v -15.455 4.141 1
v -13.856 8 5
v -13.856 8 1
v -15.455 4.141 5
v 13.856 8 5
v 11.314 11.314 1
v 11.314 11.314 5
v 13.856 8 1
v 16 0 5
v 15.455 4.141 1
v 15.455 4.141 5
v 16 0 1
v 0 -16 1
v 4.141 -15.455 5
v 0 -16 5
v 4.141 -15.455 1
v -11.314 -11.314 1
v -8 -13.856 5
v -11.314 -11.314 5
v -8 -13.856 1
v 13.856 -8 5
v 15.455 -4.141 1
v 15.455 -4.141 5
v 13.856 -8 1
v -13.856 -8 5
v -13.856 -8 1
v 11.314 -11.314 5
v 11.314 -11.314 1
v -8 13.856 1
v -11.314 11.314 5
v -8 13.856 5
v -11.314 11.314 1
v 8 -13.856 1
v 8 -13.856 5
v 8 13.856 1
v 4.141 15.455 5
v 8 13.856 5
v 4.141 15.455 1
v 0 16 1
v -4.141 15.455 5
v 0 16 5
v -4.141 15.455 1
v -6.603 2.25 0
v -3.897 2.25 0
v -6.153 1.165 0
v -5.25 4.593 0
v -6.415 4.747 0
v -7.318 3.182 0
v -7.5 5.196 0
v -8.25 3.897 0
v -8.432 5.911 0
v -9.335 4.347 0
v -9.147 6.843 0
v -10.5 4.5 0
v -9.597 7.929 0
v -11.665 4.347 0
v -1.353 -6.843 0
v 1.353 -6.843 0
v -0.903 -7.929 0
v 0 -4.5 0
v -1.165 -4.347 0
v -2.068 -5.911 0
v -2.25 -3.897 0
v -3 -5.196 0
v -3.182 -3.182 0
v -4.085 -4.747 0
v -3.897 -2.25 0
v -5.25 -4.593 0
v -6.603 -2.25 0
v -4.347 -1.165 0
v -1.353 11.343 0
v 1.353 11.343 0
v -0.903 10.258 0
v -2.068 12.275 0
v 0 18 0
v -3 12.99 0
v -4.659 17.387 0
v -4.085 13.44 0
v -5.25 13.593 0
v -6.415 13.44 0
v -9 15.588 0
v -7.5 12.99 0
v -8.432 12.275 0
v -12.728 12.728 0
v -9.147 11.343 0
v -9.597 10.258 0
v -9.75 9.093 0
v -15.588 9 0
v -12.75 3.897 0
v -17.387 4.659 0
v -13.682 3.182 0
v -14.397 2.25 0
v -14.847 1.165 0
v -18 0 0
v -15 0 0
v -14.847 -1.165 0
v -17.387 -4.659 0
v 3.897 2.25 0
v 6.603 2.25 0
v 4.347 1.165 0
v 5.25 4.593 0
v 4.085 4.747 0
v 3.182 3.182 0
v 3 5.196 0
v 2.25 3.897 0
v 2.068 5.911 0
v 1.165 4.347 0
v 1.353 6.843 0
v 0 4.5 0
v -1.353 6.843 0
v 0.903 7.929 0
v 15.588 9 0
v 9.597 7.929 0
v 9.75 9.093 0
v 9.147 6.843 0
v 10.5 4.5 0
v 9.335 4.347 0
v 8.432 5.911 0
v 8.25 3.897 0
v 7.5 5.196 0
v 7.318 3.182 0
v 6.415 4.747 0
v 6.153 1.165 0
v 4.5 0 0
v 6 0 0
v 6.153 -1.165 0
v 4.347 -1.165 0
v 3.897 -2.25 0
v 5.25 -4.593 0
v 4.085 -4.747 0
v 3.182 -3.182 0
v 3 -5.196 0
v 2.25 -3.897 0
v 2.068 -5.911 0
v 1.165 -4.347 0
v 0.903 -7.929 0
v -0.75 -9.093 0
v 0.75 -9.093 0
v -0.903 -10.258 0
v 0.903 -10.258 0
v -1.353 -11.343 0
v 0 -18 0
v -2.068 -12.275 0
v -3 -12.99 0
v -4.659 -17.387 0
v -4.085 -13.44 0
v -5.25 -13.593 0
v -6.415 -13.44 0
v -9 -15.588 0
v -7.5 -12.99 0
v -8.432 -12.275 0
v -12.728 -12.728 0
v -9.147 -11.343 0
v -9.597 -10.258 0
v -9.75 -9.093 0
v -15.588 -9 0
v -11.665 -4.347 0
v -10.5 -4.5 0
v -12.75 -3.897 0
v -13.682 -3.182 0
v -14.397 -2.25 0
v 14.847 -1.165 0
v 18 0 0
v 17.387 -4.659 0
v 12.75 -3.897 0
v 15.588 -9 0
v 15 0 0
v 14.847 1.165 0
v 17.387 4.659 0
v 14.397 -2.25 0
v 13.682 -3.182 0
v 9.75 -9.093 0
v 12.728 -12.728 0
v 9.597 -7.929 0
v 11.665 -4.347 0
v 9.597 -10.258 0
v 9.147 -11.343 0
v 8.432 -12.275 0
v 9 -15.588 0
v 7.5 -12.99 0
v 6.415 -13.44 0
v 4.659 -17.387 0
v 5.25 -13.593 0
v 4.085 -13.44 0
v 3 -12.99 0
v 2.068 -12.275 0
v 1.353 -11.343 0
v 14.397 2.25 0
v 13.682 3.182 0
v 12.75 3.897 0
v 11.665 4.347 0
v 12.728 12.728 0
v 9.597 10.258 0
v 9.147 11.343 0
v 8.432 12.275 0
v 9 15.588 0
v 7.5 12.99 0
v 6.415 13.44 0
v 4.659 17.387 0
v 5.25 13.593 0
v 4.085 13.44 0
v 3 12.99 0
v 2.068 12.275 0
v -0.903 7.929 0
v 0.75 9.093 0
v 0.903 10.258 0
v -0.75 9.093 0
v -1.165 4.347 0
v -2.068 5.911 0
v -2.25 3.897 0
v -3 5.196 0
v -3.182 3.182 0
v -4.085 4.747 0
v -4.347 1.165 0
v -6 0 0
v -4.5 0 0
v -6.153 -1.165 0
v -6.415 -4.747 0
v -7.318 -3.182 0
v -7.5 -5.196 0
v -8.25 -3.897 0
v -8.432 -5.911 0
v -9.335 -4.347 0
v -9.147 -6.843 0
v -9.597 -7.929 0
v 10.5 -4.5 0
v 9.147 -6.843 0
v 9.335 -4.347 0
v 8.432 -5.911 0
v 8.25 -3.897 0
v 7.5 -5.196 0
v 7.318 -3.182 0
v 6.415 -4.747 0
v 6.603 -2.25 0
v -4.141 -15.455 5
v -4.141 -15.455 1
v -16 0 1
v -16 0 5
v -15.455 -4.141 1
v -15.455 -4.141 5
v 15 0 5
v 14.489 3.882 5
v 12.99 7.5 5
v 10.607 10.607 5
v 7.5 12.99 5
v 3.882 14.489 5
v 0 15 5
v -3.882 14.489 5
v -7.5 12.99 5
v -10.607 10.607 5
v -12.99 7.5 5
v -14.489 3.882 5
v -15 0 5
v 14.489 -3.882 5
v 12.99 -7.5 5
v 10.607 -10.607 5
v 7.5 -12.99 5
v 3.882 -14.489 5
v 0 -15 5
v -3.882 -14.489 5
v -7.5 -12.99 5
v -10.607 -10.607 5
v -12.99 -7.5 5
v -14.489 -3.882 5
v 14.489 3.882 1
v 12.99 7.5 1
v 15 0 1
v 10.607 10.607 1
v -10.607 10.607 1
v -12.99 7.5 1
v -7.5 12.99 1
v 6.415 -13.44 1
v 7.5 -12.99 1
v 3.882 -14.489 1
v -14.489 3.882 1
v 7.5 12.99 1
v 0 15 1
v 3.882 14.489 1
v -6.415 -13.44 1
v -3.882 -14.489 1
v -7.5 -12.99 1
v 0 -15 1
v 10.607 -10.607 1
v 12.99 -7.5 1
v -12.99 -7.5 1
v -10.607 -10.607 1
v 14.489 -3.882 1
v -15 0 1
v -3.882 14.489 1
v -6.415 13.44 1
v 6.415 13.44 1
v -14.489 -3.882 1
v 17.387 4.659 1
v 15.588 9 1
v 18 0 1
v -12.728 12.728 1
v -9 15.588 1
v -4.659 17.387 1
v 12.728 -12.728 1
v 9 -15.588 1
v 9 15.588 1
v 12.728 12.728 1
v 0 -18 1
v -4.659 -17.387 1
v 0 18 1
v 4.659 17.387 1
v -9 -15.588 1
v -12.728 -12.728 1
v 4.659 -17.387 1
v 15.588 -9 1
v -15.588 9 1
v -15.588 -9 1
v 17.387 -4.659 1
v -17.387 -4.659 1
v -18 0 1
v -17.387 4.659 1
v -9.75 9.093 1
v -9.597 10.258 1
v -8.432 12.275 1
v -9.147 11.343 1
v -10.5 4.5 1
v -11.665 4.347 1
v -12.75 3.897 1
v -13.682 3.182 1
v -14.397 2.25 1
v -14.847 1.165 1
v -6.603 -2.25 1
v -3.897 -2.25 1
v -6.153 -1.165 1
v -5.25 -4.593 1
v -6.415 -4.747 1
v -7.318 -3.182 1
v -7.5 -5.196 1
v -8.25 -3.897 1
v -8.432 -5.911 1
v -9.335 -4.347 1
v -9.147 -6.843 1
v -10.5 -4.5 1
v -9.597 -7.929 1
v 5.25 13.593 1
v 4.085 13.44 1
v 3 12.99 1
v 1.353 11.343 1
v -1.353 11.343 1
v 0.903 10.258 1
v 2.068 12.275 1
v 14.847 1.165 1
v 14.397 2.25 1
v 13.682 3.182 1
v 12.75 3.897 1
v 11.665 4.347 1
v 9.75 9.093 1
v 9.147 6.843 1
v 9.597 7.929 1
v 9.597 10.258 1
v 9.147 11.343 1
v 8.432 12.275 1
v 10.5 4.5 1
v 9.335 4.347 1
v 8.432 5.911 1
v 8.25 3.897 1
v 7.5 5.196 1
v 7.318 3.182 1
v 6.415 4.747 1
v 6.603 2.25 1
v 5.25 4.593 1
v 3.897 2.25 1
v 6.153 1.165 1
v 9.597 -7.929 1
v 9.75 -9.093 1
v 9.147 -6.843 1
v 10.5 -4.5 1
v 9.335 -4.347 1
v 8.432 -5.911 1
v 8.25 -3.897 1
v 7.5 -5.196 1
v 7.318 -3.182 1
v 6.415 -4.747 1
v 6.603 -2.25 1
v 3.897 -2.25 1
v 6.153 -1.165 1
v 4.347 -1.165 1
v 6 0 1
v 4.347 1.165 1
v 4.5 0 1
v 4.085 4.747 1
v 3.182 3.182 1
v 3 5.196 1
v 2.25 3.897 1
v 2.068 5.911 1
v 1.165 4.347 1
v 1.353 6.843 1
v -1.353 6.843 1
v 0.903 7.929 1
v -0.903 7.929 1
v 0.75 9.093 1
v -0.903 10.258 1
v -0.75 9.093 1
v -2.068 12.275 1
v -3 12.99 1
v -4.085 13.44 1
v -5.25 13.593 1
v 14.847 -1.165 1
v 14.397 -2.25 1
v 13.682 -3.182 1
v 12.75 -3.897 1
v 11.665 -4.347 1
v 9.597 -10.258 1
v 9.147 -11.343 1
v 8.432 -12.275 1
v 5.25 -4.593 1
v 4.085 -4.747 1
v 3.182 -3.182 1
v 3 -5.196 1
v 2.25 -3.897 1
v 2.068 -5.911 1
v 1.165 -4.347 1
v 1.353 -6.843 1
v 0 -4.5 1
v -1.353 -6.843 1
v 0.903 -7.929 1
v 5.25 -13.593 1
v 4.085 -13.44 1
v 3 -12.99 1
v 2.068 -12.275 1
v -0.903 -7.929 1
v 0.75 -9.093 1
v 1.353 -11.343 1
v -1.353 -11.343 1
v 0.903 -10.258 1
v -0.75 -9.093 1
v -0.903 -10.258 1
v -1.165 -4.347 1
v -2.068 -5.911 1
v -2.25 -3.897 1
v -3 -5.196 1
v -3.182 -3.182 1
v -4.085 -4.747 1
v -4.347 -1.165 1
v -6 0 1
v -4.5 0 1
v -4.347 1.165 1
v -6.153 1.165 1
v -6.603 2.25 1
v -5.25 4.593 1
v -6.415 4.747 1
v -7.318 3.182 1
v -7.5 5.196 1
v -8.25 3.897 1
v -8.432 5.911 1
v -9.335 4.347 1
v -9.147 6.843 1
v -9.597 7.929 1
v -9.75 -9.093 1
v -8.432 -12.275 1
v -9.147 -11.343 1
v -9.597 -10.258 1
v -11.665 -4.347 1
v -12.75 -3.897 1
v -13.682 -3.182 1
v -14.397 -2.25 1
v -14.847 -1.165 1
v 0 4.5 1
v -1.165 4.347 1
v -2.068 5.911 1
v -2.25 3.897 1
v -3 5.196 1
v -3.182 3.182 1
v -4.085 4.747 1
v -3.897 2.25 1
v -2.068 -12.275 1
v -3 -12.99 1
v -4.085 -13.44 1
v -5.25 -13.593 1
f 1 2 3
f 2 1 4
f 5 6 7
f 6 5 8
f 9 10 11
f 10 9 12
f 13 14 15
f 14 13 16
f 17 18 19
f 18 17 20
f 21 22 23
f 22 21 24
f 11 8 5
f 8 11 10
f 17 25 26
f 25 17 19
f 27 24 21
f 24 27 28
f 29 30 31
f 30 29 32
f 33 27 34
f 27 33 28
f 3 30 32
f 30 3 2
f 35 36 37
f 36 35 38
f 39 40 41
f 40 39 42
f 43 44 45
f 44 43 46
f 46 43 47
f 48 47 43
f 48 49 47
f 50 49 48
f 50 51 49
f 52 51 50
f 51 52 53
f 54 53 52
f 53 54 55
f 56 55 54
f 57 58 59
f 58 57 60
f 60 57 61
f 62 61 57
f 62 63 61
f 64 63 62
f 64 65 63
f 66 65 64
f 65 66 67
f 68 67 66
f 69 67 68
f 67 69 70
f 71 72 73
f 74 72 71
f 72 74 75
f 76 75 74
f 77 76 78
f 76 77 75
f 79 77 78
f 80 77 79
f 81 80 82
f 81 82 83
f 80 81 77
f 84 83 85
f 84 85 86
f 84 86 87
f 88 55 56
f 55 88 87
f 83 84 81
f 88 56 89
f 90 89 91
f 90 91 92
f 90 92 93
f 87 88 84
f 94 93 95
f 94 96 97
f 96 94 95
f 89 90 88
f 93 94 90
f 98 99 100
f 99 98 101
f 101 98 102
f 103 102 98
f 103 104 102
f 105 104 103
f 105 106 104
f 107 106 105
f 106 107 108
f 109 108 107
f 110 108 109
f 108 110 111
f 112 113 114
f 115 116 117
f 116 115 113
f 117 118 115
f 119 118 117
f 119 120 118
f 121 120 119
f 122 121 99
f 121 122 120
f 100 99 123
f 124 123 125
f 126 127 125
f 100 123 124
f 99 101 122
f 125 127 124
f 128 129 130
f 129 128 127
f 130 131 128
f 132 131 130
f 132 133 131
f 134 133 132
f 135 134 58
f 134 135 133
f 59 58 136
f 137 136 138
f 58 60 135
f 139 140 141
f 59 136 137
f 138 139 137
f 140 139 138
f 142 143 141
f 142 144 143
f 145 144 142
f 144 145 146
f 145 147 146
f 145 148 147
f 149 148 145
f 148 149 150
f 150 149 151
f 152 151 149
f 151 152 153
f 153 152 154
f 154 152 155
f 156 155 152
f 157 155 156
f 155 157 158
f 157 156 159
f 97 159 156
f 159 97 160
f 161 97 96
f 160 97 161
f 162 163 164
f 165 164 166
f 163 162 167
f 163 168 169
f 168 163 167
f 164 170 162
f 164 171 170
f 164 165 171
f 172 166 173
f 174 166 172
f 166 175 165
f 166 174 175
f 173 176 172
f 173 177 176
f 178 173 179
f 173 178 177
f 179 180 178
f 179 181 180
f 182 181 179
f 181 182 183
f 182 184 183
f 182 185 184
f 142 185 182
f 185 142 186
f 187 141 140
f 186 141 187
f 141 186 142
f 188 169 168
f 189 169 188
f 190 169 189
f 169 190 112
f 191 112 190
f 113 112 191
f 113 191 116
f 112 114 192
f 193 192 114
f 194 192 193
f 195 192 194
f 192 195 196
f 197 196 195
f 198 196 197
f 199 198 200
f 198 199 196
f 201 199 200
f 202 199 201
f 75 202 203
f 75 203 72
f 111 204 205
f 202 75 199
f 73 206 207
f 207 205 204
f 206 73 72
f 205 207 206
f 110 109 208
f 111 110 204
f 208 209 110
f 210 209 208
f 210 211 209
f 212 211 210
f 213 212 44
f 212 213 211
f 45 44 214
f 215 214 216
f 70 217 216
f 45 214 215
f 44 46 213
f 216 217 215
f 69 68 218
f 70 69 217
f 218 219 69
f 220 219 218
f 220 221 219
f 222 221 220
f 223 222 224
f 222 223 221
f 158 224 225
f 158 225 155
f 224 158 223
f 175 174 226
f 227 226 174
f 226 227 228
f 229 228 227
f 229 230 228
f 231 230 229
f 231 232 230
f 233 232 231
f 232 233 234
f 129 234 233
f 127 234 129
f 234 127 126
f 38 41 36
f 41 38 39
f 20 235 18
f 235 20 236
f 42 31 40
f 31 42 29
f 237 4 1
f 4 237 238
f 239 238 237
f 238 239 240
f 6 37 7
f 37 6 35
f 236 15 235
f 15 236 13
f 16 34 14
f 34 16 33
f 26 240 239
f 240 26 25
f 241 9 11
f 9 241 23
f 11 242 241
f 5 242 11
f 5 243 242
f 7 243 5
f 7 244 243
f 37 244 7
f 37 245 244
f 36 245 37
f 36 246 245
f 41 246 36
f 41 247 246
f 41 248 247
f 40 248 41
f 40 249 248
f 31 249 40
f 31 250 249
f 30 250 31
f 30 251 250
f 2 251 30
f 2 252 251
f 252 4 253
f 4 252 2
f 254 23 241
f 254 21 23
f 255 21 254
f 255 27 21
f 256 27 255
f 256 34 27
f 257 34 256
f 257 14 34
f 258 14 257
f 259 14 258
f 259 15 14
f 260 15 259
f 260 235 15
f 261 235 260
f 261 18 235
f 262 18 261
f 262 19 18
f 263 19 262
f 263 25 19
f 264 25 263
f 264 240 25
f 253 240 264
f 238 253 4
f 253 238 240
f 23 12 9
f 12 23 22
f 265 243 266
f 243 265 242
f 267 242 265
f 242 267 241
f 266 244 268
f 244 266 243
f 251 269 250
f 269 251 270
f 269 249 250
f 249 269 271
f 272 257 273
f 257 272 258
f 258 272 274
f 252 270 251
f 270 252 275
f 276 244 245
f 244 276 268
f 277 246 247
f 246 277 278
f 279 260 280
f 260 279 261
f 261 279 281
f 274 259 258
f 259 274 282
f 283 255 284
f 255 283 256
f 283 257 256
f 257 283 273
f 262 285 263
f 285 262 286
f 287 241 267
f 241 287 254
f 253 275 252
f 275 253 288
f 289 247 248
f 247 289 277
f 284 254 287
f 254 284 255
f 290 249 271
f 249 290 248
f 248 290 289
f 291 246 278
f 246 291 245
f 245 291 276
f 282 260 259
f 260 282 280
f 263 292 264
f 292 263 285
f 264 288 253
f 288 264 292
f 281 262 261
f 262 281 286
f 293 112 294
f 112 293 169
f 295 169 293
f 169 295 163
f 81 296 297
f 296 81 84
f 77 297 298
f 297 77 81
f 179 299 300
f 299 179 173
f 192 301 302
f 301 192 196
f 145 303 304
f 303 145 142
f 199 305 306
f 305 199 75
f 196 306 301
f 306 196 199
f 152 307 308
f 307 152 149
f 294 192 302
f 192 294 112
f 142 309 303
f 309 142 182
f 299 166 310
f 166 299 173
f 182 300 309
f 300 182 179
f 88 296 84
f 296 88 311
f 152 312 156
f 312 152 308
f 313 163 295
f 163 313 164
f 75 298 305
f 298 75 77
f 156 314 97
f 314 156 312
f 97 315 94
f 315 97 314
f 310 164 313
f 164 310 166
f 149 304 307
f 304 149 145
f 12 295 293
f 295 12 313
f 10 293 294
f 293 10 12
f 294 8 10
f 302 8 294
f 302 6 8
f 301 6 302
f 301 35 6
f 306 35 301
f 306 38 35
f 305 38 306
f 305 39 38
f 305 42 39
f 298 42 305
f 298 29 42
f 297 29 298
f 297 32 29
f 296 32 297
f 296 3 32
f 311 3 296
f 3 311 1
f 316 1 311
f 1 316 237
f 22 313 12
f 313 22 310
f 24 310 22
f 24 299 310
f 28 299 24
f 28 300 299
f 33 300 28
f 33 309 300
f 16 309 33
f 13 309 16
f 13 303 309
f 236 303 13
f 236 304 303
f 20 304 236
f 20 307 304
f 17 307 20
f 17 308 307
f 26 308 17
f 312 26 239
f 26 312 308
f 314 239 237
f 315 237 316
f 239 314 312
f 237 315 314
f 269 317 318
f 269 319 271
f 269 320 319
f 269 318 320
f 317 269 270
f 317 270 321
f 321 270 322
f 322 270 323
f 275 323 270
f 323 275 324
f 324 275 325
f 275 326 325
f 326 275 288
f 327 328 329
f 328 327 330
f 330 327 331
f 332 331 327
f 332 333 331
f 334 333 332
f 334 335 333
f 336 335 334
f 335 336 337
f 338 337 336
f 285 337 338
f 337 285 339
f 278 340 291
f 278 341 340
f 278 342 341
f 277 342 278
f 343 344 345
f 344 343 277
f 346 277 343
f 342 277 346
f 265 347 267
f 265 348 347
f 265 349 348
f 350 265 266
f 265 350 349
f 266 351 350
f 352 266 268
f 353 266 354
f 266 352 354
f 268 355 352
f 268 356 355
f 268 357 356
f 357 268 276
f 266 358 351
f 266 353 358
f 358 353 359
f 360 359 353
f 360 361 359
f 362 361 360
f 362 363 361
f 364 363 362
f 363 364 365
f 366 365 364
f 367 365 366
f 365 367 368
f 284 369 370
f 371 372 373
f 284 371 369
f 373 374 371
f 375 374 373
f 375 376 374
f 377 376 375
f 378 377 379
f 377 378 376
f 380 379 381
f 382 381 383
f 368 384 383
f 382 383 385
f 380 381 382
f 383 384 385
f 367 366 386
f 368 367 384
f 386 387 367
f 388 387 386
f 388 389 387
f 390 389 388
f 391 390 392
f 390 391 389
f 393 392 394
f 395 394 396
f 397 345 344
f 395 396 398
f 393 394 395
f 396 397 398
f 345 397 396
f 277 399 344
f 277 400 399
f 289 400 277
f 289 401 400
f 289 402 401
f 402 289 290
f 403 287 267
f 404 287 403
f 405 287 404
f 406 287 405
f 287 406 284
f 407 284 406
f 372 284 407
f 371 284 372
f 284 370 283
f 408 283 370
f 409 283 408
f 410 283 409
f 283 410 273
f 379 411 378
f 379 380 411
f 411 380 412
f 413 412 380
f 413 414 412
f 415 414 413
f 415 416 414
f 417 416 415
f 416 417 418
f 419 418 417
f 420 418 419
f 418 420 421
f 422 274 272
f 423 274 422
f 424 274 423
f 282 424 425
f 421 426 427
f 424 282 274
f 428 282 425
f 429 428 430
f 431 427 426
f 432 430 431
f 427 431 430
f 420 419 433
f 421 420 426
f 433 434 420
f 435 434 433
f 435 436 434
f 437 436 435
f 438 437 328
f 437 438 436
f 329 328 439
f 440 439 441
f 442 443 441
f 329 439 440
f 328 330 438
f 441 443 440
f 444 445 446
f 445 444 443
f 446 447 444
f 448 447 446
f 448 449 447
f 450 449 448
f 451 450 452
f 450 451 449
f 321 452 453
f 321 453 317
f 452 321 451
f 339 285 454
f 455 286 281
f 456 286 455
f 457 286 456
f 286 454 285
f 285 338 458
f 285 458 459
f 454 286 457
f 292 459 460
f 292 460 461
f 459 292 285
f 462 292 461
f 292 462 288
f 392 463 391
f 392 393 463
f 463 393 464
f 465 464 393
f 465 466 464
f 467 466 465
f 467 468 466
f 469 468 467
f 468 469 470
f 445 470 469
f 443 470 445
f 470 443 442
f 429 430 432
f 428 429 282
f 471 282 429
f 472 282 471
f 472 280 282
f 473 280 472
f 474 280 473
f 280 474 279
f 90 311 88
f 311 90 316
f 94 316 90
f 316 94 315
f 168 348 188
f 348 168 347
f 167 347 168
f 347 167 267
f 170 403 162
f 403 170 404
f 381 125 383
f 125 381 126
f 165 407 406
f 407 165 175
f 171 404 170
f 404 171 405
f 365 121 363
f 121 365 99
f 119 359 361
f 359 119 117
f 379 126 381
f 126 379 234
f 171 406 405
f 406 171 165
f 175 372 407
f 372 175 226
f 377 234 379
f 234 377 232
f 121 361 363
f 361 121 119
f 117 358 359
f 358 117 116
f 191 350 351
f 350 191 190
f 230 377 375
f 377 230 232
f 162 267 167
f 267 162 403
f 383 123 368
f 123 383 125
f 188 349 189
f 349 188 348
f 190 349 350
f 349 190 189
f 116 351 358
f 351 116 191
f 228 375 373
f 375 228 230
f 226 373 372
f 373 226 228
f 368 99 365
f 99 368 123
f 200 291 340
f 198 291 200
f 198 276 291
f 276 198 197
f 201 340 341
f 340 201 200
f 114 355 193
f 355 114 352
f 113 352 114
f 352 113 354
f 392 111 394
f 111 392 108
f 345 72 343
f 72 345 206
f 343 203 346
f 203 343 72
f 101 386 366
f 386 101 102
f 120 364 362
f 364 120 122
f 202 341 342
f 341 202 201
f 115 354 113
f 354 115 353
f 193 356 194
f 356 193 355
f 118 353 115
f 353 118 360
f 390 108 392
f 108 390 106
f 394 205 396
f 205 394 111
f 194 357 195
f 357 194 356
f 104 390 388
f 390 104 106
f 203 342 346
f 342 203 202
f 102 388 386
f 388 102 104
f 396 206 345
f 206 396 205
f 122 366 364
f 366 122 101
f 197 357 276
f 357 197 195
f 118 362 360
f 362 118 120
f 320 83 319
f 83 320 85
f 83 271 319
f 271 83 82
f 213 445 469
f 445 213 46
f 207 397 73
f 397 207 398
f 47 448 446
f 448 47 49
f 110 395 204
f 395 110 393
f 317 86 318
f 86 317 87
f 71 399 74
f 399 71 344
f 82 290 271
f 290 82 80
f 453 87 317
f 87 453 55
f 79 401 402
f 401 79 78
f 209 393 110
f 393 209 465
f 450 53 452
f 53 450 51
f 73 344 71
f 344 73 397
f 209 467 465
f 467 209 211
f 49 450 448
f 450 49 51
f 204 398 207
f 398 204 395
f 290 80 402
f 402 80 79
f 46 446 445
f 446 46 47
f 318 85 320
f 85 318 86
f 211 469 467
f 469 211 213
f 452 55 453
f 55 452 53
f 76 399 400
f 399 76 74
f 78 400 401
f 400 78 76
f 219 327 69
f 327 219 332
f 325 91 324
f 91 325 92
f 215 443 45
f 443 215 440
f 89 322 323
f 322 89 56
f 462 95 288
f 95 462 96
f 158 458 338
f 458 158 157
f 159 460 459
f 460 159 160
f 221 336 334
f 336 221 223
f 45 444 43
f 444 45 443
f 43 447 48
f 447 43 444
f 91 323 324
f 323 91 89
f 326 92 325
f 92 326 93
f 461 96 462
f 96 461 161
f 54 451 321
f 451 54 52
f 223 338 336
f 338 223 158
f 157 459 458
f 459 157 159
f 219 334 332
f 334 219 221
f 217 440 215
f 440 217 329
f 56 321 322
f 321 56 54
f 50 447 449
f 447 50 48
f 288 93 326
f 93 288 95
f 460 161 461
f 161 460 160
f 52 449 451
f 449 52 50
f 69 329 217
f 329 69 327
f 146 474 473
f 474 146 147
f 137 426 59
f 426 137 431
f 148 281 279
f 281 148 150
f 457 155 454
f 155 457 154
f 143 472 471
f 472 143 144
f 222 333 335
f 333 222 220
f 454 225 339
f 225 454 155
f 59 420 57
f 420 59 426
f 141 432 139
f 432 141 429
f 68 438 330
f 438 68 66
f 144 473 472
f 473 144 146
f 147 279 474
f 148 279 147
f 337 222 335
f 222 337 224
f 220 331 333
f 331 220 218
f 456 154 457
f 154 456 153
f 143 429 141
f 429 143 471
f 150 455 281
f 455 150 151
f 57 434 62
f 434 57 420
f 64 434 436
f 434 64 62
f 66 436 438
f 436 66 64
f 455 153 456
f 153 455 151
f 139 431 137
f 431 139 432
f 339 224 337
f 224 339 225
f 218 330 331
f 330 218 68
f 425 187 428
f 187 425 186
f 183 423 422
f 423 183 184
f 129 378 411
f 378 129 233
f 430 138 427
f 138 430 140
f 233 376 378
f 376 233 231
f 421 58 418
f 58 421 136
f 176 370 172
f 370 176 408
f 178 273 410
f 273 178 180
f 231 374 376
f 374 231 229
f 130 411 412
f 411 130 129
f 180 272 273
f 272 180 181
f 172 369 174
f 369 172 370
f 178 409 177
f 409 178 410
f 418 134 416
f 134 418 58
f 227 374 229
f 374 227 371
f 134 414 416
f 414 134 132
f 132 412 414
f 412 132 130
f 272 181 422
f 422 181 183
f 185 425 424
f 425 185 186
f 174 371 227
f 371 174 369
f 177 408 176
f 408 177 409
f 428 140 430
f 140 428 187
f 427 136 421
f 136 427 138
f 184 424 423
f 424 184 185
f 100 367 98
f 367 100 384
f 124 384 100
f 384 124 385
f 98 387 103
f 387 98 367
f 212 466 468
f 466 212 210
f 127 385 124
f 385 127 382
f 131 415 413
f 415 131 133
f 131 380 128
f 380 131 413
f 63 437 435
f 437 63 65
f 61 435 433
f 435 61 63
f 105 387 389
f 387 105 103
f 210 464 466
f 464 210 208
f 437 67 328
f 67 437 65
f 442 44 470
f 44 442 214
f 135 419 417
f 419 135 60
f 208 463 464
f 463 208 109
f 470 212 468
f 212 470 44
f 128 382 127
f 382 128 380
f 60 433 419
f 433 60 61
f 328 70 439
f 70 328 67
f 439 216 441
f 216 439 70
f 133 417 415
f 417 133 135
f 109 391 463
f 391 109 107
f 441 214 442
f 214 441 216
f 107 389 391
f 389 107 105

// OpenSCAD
hub_diameter=32;
hub_height=4;
shaft_diameter=9;
wall_thickness=1;
brim_width=2;
hole_diameter=9;
$fn=24;
difference() {
	body();
	shaft();
	holes();
}
module body() { 
	cylinder(d=hub_diameter+brim_width*2,h=wall_thickness);
	difference() {
		cylinder(d=hub_diameter,h=hub_height+wall_thickness);
		cylinder(d=hub_diameter-wall_thickness*2,h=hub_height+wall_thickness);
	}
}
module shaft() {
	cylinder(d=shaft_diameter,h=hub_height);
}
module holes() {
	offset=hub_diameter/2-wall_thickness-hole_diameter/2;
	for(i=[0:360/6:360]) {
		rotate([0,0,i])
			translate([offset,0,0])
			cylinder(d=hole_diameter,h=wall_thickness);
	}
}
